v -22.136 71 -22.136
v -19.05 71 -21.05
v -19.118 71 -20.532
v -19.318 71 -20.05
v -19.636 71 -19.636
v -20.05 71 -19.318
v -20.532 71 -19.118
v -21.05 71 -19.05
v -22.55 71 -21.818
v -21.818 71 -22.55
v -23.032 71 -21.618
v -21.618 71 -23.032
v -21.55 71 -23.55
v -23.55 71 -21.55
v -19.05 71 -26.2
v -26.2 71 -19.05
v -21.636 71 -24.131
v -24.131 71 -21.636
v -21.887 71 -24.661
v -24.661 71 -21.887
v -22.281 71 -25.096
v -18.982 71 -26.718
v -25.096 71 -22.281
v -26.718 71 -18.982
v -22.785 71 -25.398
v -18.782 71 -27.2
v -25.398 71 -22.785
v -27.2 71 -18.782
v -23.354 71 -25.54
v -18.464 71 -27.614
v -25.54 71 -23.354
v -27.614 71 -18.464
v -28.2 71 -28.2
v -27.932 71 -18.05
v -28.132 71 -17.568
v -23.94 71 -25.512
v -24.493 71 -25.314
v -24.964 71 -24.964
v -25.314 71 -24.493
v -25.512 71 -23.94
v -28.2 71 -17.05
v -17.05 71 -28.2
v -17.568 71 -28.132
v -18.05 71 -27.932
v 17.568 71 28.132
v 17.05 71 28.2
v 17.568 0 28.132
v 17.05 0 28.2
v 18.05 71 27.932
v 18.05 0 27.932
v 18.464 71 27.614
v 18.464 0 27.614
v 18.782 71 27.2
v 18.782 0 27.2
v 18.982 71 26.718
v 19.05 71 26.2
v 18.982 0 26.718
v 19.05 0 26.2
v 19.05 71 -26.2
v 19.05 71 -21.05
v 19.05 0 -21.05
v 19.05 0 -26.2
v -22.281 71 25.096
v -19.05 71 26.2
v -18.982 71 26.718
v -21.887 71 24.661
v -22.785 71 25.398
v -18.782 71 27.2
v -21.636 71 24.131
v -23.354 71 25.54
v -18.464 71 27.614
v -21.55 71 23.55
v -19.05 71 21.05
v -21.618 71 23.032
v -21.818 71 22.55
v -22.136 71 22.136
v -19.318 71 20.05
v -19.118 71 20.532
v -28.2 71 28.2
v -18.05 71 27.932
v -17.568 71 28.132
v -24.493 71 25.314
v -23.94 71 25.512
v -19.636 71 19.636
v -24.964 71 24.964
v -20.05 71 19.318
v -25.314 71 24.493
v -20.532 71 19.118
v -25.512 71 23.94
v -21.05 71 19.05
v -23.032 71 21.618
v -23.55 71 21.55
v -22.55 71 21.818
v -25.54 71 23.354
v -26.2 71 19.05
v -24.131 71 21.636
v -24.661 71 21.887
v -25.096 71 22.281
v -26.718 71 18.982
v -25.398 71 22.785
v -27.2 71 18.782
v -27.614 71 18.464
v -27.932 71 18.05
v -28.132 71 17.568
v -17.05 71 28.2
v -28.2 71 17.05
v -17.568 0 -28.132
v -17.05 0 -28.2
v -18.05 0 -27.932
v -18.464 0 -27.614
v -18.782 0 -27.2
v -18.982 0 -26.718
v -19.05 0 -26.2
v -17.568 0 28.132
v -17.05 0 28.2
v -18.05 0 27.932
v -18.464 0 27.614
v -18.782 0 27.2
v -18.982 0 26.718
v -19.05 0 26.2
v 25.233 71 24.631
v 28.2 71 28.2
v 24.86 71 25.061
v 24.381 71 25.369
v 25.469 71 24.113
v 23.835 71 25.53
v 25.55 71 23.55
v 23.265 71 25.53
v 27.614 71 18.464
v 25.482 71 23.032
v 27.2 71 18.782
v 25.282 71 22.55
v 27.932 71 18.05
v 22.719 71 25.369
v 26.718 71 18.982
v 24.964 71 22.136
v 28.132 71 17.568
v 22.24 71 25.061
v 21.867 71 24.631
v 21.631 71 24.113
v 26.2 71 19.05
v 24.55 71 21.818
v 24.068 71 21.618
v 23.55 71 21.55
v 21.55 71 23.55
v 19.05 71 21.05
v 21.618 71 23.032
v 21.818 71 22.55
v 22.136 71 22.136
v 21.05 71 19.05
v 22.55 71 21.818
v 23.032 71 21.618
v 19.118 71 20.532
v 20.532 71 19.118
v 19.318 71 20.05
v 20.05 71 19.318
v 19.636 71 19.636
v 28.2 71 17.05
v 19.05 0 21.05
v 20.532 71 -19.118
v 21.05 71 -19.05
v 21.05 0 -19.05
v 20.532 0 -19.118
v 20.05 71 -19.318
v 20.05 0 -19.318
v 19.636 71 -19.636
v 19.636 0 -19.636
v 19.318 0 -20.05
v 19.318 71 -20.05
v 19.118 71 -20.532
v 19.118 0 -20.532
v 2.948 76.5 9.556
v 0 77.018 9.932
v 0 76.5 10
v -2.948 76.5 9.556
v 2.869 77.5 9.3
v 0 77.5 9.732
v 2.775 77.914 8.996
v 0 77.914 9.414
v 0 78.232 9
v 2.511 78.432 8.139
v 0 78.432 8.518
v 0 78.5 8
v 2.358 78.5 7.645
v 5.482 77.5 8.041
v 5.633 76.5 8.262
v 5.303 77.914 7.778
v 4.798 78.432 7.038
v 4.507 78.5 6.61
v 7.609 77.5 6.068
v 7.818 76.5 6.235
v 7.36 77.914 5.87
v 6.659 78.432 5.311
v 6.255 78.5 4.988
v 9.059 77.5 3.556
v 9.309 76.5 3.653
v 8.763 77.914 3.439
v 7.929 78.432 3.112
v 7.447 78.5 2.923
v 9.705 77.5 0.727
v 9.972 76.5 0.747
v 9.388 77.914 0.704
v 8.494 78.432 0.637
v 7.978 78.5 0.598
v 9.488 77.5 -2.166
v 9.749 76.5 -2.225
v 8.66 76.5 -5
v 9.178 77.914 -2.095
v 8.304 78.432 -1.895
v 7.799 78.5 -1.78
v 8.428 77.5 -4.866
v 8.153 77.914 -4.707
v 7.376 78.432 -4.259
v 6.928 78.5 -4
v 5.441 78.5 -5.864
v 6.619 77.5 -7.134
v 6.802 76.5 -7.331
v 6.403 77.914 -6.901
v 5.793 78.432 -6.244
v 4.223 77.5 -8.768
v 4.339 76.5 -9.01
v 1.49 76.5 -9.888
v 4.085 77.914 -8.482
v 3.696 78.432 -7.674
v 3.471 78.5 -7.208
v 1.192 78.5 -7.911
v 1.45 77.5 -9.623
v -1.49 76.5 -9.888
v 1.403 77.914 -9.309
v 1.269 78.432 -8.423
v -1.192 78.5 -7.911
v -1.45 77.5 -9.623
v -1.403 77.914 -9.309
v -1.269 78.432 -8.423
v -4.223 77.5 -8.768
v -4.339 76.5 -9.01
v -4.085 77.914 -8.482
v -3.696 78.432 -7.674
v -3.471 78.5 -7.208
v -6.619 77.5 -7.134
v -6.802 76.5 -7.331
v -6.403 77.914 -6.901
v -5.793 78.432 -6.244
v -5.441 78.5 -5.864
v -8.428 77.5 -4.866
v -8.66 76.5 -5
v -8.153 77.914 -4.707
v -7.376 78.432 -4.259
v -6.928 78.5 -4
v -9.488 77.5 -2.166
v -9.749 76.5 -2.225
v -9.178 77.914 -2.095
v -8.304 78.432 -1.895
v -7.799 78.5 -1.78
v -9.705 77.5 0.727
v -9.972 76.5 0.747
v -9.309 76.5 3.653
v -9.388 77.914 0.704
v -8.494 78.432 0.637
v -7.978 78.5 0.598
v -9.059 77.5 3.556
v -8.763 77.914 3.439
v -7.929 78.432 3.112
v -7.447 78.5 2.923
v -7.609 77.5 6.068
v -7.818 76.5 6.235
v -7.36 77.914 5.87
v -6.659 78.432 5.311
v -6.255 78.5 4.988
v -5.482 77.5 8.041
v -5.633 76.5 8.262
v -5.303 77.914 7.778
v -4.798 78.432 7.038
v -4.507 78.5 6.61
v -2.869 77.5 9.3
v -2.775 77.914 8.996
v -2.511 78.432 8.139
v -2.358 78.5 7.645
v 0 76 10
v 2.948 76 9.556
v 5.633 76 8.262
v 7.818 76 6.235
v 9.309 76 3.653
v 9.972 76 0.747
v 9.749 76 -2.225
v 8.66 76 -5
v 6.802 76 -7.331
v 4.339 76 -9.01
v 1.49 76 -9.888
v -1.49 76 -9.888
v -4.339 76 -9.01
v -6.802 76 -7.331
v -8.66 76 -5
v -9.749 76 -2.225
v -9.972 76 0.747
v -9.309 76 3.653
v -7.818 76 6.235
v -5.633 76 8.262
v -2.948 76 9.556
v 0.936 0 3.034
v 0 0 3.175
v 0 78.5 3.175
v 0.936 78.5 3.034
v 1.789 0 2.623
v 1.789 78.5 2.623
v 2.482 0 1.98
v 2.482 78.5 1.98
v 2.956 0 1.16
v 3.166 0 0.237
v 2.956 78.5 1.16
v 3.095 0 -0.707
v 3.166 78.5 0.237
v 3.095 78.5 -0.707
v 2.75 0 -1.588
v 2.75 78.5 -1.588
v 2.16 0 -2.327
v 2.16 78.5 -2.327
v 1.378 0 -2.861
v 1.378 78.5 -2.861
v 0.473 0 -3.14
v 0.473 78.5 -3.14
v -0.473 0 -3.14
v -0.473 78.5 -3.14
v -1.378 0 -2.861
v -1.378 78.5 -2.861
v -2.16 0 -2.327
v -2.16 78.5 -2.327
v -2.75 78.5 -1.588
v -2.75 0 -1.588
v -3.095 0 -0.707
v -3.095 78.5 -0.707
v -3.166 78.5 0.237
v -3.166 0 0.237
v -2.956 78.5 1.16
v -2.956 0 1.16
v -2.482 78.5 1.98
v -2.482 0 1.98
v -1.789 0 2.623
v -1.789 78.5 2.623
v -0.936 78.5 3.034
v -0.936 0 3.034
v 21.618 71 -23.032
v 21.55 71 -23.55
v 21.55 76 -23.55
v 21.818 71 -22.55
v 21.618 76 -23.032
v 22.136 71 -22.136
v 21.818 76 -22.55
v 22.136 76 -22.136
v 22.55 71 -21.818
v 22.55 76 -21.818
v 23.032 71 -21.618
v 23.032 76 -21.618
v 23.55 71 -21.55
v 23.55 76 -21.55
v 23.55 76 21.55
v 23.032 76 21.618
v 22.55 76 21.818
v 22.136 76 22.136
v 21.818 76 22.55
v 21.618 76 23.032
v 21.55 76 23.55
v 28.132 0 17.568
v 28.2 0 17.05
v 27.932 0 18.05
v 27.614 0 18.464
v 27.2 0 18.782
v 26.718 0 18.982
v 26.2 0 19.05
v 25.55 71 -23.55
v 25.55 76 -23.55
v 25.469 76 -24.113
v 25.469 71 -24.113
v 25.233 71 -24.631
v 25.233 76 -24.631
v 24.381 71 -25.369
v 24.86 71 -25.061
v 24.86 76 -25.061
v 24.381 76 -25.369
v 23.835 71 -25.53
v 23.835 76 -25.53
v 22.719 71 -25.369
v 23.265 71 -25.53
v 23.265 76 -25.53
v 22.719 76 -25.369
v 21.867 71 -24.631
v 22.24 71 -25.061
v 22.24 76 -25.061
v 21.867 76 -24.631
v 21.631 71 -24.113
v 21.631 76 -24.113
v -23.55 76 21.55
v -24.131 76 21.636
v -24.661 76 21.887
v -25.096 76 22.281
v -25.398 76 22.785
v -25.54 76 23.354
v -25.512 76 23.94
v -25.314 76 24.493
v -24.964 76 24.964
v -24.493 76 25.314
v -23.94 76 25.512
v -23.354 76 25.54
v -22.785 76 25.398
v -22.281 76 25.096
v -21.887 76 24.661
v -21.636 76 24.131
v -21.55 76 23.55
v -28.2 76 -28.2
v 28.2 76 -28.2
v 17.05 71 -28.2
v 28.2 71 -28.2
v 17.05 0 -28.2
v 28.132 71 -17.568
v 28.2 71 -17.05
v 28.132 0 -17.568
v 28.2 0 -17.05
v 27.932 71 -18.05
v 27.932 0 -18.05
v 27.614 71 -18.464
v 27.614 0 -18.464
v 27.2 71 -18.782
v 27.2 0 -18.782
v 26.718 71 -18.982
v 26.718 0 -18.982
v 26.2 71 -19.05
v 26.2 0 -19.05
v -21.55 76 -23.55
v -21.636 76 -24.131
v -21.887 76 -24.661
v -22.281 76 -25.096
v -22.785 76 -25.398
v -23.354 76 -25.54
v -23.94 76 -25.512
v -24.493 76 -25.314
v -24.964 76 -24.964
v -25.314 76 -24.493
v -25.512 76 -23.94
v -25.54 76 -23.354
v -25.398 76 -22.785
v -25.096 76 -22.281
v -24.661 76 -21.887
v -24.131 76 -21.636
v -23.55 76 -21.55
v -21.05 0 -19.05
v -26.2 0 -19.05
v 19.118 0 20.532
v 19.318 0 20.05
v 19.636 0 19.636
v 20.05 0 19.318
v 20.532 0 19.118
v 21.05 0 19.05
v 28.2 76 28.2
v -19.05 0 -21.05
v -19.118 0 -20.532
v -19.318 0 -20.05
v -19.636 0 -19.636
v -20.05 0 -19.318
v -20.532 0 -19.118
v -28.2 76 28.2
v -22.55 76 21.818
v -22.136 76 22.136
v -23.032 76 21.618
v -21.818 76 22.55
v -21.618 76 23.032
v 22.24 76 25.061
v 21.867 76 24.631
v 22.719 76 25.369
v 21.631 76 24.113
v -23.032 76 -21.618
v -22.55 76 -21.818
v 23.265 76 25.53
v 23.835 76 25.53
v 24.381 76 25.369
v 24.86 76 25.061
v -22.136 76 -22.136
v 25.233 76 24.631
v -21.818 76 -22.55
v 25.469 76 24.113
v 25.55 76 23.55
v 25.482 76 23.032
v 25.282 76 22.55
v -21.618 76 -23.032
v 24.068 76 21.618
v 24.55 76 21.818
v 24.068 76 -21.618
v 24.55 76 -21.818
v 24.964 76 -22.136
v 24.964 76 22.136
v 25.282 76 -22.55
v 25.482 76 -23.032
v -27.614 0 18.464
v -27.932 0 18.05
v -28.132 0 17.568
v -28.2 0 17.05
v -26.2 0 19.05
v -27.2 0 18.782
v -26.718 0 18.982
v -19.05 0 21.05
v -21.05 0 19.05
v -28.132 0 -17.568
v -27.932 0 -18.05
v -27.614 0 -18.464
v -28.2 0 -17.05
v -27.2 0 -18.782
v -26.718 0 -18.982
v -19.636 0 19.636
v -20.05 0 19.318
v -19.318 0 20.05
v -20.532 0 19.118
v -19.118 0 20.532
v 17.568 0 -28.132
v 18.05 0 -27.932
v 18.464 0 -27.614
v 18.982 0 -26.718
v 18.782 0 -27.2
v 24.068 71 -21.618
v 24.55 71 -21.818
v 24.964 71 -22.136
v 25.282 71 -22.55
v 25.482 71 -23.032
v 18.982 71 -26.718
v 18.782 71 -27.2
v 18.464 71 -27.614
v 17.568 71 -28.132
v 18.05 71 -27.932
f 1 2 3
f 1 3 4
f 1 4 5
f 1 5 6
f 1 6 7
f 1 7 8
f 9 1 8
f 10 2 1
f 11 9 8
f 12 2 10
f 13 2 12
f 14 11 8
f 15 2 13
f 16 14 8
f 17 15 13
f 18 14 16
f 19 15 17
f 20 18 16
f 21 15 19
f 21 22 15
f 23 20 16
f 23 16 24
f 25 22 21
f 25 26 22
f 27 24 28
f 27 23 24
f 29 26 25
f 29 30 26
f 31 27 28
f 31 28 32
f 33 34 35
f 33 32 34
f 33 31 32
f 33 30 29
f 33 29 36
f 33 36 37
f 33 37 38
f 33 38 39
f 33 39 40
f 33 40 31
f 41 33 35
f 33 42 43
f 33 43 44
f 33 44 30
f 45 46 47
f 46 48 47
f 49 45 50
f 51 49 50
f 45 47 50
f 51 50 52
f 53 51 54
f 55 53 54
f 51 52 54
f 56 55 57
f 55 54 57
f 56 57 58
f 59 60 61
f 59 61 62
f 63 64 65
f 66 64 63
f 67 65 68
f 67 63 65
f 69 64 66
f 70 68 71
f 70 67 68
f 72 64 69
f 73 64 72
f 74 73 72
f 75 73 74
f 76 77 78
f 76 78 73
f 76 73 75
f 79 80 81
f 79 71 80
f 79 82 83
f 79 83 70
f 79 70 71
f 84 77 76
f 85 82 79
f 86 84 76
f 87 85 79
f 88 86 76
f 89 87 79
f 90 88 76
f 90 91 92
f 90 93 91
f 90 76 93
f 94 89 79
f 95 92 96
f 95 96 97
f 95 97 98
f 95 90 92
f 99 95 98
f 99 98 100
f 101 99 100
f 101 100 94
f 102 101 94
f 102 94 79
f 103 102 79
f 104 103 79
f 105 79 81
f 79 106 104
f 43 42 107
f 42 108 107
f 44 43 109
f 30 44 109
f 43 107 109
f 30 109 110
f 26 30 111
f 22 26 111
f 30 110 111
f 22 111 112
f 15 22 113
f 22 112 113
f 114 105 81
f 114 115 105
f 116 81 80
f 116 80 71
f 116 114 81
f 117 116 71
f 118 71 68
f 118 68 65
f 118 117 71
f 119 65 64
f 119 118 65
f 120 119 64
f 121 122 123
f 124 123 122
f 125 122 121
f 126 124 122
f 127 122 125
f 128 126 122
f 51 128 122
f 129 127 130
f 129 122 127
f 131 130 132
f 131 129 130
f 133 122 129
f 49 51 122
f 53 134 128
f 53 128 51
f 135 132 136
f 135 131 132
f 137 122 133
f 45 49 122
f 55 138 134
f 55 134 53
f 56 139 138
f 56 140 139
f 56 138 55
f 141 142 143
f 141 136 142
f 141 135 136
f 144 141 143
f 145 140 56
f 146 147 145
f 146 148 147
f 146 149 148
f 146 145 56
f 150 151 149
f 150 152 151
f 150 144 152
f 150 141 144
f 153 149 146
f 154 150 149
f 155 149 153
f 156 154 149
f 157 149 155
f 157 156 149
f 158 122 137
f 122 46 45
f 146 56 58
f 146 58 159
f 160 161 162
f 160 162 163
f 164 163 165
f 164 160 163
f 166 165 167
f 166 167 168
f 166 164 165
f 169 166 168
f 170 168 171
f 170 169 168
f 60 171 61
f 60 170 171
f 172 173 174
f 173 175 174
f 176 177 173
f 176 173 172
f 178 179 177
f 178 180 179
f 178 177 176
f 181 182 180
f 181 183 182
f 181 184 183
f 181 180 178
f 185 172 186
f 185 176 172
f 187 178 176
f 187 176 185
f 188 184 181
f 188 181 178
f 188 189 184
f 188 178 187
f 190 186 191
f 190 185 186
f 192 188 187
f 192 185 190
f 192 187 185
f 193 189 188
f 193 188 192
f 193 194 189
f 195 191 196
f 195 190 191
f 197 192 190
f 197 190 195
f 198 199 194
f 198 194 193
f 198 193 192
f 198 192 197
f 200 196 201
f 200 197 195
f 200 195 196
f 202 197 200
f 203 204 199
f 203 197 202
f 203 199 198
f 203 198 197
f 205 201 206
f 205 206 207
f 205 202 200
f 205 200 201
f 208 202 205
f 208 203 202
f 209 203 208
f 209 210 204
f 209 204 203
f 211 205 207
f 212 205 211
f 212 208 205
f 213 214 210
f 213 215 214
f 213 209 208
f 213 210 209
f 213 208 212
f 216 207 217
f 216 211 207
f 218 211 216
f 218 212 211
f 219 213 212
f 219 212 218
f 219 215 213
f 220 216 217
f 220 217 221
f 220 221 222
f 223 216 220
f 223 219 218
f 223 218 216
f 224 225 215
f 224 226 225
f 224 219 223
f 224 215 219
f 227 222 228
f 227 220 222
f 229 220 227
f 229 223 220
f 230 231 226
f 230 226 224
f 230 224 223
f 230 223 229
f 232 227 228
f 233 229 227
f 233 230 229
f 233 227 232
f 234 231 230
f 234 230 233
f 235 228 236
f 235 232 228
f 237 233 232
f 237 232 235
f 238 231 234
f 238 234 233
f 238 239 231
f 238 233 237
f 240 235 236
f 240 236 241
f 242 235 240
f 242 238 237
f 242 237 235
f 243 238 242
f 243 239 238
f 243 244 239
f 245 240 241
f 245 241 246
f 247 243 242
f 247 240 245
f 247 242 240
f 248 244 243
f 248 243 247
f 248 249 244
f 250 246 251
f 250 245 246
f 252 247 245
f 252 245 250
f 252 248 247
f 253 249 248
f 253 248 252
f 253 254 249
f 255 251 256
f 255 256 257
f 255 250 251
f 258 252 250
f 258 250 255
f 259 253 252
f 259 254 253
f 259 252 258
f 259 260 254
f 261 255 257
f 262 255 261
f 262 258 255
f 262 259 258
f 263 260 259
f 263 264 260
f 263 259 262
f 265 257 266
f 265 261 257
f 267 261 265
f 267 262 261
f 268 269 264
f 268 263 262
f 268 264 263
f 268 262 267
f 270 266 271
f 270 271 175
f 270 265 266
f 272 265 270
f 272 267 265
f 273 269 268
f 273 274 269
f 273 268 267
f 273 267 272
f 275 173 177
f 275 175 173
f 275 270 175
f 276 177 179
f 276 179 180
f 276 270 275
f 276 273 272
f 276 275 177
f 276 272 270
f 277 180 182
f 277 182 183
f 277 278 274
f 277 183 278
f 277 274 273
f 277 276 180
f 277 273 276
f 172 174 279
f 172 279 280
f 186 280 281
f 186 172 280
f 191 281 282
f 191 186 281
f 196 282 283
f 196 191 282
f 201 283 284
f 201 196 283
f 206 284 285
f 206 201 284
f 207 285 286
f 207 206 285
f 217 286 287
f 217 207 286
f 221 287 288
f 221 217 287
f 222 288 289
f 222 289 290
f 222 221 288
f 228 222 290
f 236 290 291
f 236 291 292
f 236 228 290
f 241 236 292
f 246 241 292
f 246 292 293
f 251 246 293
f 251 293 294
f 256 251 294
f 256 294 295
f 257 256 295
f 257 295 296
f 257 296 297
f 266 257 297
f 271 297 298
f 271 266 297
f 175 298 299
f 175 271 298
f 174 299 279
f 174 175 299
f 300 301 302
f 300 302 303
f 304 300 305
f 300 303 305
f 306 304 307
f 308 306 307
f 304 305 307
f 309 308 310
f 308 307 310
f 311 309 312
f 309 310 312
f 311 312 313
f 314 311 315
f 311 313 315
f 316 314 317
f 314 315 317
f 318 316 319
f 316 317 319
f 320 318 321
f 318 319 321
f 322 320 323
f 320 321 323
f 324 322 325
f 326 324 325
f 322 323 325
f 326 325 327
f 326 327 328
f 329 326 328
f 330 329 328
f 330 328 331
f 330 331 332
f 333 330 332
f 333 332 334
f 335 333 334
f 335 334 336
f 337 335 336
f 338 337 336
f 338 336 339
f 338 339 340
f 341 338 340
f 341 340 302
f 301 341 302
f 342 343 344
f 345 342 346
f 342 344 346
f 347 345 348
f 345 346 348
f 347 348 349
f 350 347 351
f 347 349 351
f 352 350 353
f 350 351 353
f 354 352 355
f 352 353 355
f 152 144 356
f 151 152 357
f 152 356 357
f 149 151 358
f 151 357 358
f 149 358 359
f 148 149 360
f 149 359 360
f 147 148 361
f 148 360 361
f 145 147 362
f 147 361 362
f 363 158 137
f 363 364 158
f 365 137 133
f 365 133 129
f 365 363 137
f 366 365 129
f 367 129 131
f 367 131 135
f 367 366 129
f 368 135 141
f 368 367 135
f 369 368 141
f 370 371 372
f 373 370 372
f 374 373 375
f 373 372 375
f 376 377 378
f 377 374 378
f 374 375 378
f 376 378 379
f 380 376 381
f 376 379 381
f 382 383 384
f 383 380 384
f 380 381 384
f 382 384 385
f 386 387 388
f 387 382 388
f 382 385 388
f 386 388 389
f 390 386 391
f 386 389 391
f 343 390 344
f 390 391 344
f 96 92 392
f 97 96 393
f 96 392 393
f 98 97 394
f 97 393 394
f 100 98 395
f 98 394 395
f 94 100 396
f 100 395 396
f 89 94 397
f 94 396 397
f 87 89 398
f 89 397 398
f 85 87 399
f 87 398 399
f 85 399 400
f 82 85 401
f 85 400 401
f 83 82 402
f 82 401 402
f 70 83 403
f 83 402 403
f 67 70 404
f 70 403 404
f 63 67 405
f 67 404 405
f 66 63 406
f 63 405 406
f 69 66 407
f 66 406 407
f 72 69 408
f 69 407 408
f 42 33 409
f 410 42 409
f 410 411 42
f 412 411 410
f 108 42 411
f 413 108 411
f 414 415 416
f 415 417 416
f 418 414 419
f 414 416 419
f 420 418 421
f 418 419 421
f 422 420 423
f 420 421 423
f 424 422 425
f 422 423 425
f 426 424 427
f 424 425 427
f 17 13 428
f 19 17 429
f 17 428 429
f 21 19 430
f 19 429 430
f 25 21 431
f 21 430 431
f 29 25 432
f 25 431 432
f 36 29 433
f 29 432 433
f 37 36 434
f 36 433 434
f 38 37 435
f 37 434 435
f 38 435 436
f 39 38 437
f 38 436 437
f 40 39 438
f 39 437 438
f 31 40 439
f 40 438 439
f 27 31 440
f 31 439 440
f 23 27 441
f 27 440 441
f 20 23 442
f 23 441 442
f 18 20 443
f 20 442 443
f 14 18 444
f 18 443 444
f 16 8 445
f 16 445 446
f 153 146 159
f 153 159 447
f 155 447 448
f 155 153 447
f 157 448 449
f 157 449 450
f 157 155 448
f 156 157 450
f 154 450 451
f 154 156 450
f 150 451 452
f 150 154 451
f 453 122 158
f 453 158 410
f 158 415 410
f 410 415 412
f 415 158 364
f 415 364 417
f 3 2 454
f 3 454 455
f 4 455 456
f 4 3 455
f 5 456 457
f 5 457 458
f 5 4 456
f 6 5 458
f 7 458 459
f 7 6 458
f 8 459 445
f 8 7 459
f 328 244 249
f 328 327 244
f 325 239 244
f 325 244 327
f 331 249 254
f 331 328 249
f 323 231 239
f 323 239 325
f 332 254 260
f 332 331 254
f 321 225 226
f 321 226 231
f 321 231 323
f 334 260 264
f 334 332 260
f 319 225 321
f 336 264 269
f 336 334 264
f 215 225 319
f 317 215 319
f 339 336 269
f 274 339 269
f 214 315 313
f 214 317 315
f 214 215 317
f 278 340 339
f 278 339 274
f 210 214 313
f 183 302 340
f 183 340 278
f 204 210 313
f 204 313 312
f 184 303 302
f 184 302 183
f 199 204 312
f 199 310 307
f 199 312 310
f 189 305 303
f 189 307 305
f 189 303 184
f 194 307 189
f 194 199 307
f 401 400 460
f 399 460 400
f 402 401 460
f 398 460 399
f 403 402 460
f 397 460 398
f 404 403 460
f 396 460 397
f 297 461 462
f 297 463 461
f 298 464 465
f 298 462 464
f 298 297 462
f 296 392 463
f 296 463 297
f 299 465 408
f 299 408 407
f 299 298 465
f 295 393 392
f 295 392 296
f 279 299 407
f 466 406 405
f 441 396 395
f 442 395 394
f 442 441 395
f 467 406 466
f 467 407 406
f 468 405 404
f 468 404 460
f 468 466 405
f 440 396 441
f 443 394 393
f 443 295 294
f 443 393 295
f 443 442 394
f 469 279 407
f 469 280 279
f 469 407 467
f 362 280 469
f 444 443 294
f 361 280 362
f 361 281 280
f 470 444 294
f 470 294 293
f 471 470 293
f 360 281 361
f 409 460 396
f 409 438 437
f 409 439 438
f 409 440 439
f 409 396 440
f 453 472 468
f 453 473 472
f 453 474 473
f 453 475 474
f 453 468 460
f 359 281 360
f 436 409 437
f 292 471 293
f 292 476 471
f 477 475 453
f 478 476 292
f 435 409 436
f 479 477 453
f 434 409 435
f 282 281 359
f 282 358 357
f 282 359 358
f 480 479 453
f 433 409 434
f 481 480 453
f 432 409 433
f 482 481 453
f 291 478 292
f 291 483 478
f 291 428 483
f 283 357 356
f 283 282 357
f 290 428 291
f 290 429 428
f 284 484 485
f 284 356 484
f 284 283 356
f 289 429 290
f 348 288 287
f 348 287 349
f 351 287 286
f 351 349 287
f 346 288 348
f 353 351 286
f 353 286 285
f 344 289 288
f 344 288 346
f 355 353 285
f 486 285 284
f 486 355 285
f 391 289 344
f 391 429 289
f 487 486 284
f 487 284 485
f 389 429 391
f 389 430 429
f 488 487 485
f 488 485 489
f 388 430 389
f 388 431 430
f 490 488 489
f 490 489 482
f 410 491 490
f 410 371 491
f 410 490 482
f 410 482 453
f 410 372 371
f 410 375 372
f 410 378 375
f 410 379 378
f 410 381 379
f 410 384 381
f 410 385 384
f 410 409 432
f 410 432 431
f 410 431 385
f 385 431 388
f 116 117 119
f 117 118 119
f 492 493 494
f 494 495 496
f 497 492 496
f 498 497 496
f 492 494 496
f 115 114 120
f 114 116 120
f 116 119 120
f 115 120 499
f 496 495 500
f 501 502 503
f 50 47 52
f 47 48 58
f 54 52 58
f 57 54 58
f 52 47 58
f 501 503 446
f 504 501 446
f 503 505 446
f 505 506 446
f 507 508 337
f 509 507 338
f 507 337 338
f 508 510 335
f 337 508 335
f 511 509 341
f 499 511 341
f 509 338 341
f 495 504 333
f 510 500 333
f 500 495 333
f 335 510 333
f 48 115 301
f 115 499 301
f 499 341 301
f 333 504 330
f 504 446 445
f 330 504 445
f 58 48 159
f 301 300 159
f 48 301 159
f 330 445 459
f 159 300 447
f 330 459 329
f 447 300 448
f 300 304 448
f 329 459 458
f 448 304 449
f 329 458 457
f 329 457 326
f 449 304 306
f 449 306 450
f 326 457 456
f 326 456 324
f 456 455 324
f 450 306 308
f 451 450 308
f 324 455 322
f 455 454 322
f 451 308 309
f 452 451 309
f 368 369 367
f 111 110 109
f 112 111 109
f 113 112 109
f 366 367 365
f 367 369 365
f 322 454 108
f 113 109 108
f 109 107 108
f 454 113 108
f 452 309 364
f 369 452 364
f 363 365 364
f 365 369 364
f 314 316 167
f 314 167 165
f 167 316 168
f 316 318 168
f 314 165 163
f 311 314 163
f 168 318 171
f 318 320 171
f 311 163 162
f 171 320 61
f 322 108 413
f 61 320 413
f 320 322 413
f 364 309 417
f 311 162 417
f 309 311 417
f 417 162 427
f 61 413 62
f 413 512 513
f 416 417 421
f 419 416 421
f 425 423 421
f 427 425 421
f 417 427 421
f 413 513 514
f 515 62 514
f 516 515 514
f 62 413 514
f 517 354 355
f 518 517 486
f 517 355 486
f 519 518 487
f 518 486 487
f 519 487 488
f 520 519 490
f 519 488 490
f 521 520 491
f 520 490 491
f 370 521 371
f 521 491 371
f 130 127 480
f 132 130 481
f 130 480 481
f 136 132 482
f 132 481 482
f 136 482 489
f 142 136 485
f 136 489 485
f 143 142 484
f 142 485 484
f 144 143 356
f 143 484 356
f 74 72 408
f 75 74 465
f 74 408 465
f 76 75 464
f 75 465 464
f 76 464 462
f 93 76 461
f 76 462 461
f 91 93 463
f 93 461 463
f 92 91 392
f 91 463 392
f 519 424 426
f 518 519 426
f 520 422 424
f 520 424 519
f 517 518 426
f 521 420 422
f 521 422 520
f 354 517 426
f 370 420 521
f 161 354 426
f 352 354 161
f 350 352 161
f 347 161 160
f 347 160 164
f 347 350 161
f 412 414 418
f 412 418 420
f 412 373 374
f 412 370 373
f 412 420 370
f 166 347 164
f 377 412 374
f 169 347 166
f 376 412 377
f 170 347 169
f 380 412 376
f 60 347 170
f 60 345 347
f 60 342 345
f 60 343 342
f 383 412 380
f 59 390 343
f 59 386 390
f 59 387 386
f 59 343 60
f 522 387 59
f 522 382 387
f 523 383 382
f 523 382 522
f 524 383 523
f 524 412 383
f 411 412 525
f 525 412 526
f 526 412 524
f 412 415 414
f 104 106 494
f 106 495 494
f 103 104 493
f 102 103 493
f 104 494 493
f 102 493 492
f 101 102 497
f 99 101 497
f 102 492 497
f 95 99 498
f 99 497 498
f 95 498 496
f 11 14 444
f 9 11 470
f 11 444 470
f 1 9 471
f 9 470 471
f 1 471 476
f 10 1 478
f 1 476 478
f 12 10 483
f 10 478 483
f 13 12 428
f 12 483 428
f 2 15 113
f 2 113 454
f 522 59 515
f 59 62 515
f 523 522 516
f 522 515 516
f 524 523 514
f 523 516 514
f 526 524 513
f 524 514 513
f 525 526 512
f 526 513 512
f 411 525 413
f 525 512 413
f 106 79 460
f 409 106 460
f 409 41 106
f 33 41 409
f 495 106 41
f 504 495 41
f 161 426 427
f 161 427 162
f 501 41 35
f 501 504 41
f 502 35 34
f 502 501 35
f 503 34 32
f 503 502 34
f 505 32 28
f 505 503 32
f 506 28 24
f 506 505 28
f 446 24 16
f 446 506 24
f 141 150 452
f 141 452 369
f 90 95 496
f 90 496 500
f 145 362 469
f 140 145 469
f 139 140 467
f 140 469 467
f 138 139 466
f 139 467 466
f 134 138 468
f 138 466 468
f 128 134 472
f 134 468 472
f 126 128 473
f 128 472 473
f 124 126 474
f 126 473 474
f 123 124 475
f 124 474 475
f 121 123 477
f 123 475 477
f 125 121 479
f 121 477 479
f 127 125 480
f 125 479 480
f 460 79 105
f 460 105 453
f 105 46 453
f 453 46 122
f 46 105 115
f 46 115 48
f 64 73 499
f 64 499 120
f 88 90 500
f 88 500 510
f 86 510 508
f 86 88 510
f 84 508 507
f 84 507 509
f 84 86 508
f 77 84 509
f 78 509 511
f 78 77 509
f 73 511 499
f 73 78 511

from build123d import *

# Parameters (mm, degrees)
SKETCH2_W           = 56.4
SKETCH2_H           = 56.4
BOSS_EXTRUDE1_DEPTH = 76
SKETCH3_R           = 3.175
CUT_EXTRUDE1_DEPTH  = 76
CUT_EXTRUDE2_START  = -71
SKETCH5_R           = 2
CUT_EXTRUDE2_DEPTH  = 71
FILLET1_R           = 2
BOSS_EXTRUDE2_START = 2.5
SKETCH6_R           = 10
SKETCH6_R_2         = 3.175
BOSS_EXTRUDE2_DEPTH = 2.5
FILLET2_R           = 2


with BuildPart() as part:
    # Sketch2 → Boss-Extrude1 (new body)
    with BuildSketch(Plane(origin=(0, 0, 0), x_dir=(1, 0, 0), z_dir=(0, 1, 0))):
        Rectangle(SKETCH2_W, SKETCH2_H)
    extrude(amount=BOSS_EXTRUDE1_DEPTH)

    # Sketch3 → Cut-Extrude1 (cut)
    with BuildSketch(Plane(origin=(0, 76, 0), x_dir=(1, 0, 0), z_dir=(0, 1, 0))):
        with BuildLine():
            Line((-23.55, 21.55), (-23.55, 23.55))
            Line((-23.55, 23.55), (-21.55, 23.55))
            ThreePointArc((-21.55, 23.55), (-24.964213562, 24.964213562), (-23.55, 21.55))
        make_face()
        with BuildLine():
            Line((-21.55, 23.55), (-23.55, 23.55))
            Line((-23.55, 23.55), (-23.55, 21.55))
            ThreePointArc((-23.55, 21.55), (-22.135786438, 22.135786438), (-21.55, 23.55))
        make_face()
        with BuildLine():
            ThreePointArc((25.55, 23.55), (23.55, 25.55), (21.55, 23.55))
            Line((21.55, 23.55), (23.55, 23.55))
            Line((23.55, 23.55), (23.55, 21.55))
            ThreePointArc((23.55, 21.55), (24.964213562, 22.135786438), (25.55, 23.55))
        make_face()
        with BuildLine():
            Line((23.55, 23.55), (21.55, 23.55))
            ThreePointArc((21.55, 23.55), (22.135786438, 22.135786438), (23.55, 21.55))
            Line((23.55, 21.55), (23.55, 23.55))
        make_face()
        with Locations(Location((0, 0, 0), (0, 0, 270))):
            Circle(SKETCH3_R)
        with BuildLine():
            ThreePointArc((-21.55, -23.55), (-22.135786438, -22.135786438), (-23.55, -21.55))
            Line((-23.55, -21.55), (-23.55, -23.55))
            Line((-23.55, -23.55), (-21.55, -23.55))
        make_face()
        with BuildLine():
            Line((-23.55, -23.55), (-23.55, -21.55))
            ThreePointArc((-23.55, -21.55), (-24.964213562, -24.964213562), (-21.55, -23.55))
            Line((-21.55, -23.55), (-23.55, -23.55))
        make_face()
        with BuildLine():
            ThreePointArc((25.55, -23.55), (24.964213562, -22.135786438), (23.55, -21.55))
            Line((23.55, -21.55), (23.55, -23.55))
            Line((23.55, -23.55), (21.55, -23.55))
            ThreePointArc((21.55, -23.55), (23.55, -25.55), (25.55, -23.55))
        make_face()
        with BuildLine():
            Line((23.55, -23.55), (23.55, -21.55))
            ThreePointArc((23.55, -21.55), (22.135786438, -22.135786438), (21.55, -23.55))
            Line((21.55, -23.55), (23.55, -23.55))
        make_face()
    extrude(amount=-CUT_EXTRUDE1_DEPTH, mode=Mode.SUBTRACT)

    # Sketch5 → Cut-Extrude2 (cut)
    # profile 1 of 4: a face of its own
    with BuildSketch(Plane(origin=(0, 0, 0), x_dir=(-1, 0, 0), z_dir=(0, -1, 0)).offset(CUT_EXTRUDE2_START)):
        with BuildLine():
            Line((19.05, 28.2), (19.05, 21.05))
            ThreePointArc((19.05, 21.05), (19.635786438, 19.635786438), (21.05, 19.05))
            Line((21.05, 19.05), (28.2, 19.05))
            Line((28.2, 19.05), (28.2, 28.2))
            Line((28.2, 28.2), (19.05, 28.2))
        make_face()
        with Locations((23.55, 23.55)):
            Circle(SKETCH5_R, mode=Mode.SUBTRACT)
    # profile 2 of 4: a face of its own
    with BuildSketch(Plane(origin=(0, 0, 0), x_dir=(-1, 0, 0), z_dir=(0, -1, 0)).offset(CUT_EXTRUDE2_START)):
        with BuildLine():
            Line((-19.05, 21.05), (-19.05, 28.2))
            Line((-19.05, 28.2), (-28.2, 28.2))
            Line((-28.2, 28.2), (-28.2, 19.05))
            Line((-28.2, 19.05), (-21.05, 19.05))
            ThreePointArc((-21.05, 19.05), (-19.635786438, 19.635786438), (-19.05, 21.05))
        make_face()
        with Locations((-23.55, 23.55)):
            Circle(SKETCH5_R, mode=Mode.SUBTRACT)
    # profile 3 of 4: a face of its own
    with BuildSketch(Plane(origin=(0, 0, 0), x_dir=(-1, 0, 0), z_dir=(0, -1, 0)).offset(CUT_EXTRUDE2_START)):
        with BuildLine():
            Line((28.2, -28.2), (28.2, -19.05))
            Line((28.2, -19.05), (21.05, -19.05))
            ThreePointArc((21.05, -19.05), (19.635786438, -19.635786438), (19.05, -21.05))
            Line((19.05, -21.05), (19.05, -28.2))
            Line((19.05, -28.2), (28.2, -28.2))
        make_face()
        with Locations((23.55, -23.55)):
            Circle(SKETCH5_R, mode=Mode.SUBTRACT)
    # profile 4 of 4: a face of its own
    with BuildSketch(Plane(origin=(0, 0, 0), x_dir=(-1, 0, 0), z_dir=(0, -1, 0)).offset(CUT_EXTRUDE2_START)):
        with BuildLine():
            Line((-21.05, -19.05), (-28.2, -19.05))
            Line((-28.2, -19.05), (-28.2, -28.2))
            Line((-28.2, -28.2), (-19.05, -28.2))
            Line((-19.05, -28.2), (-19.05, -21.05))
            ThreePointArc((-19.05, -21.05), (-19.635786438, -19.635786438), (-21.05, -19.05))
        make_face()
        with Locations((-23.55, -23.55)):
            Circle(SKETCH5_R, mode=Mode.SUBTRACT)
    extrude(amount=CUT_EXTRUDE2_DEPTH, mode=Mode.SUBTRACT)

    # Fillet1
    fillet1_edges = [part.edges().sort_by_distance(p)[0] for p in [
        (-19.05, 35.5, -28.2),
        (-28.2, 35.5, -19.05),
        (28.2, 35.5, -19.05),
        (19.05, 35.5, -28.2),
        (19.05, 35.5, 28.2),
        (28.2, 35.5, 19.05),
        (-28.2, 35.5, 19.05),
        (-19.05, 35.5, 28.2),
    ]]
    fillet(fillet1_edges, radius=FILLET1_R)

    # Sketch6 → Boss-Extrude2 (add)
    with BuildSketch(Plane(origin=(0, 76, 0), x_dir=(1, 0, 0), z_dir=(0, 1, 0)).offset(BOSS_EXTRUDE2_START)):
        with Locations(Location((0, 0, 0), (0, 0, 270))):
            Circle(SKETCH6_R)
        with Locations(Location((0, 0, 0), (0, 0, 270))):
            Circle(SKETCH6_R_2, mode=Mode.SUBTRACT)
    extrude(amount=-BOSS_EXTRUDE2_DEPTH)

    # Fillet2
    fillet2_edges = [part.edges().sort_by_distance(p)[0] for p in [
        (0, 78.5, -10),
    ]]
    fillet(fillet2_edges, radius=FILLET2_R)


solid = part.part
